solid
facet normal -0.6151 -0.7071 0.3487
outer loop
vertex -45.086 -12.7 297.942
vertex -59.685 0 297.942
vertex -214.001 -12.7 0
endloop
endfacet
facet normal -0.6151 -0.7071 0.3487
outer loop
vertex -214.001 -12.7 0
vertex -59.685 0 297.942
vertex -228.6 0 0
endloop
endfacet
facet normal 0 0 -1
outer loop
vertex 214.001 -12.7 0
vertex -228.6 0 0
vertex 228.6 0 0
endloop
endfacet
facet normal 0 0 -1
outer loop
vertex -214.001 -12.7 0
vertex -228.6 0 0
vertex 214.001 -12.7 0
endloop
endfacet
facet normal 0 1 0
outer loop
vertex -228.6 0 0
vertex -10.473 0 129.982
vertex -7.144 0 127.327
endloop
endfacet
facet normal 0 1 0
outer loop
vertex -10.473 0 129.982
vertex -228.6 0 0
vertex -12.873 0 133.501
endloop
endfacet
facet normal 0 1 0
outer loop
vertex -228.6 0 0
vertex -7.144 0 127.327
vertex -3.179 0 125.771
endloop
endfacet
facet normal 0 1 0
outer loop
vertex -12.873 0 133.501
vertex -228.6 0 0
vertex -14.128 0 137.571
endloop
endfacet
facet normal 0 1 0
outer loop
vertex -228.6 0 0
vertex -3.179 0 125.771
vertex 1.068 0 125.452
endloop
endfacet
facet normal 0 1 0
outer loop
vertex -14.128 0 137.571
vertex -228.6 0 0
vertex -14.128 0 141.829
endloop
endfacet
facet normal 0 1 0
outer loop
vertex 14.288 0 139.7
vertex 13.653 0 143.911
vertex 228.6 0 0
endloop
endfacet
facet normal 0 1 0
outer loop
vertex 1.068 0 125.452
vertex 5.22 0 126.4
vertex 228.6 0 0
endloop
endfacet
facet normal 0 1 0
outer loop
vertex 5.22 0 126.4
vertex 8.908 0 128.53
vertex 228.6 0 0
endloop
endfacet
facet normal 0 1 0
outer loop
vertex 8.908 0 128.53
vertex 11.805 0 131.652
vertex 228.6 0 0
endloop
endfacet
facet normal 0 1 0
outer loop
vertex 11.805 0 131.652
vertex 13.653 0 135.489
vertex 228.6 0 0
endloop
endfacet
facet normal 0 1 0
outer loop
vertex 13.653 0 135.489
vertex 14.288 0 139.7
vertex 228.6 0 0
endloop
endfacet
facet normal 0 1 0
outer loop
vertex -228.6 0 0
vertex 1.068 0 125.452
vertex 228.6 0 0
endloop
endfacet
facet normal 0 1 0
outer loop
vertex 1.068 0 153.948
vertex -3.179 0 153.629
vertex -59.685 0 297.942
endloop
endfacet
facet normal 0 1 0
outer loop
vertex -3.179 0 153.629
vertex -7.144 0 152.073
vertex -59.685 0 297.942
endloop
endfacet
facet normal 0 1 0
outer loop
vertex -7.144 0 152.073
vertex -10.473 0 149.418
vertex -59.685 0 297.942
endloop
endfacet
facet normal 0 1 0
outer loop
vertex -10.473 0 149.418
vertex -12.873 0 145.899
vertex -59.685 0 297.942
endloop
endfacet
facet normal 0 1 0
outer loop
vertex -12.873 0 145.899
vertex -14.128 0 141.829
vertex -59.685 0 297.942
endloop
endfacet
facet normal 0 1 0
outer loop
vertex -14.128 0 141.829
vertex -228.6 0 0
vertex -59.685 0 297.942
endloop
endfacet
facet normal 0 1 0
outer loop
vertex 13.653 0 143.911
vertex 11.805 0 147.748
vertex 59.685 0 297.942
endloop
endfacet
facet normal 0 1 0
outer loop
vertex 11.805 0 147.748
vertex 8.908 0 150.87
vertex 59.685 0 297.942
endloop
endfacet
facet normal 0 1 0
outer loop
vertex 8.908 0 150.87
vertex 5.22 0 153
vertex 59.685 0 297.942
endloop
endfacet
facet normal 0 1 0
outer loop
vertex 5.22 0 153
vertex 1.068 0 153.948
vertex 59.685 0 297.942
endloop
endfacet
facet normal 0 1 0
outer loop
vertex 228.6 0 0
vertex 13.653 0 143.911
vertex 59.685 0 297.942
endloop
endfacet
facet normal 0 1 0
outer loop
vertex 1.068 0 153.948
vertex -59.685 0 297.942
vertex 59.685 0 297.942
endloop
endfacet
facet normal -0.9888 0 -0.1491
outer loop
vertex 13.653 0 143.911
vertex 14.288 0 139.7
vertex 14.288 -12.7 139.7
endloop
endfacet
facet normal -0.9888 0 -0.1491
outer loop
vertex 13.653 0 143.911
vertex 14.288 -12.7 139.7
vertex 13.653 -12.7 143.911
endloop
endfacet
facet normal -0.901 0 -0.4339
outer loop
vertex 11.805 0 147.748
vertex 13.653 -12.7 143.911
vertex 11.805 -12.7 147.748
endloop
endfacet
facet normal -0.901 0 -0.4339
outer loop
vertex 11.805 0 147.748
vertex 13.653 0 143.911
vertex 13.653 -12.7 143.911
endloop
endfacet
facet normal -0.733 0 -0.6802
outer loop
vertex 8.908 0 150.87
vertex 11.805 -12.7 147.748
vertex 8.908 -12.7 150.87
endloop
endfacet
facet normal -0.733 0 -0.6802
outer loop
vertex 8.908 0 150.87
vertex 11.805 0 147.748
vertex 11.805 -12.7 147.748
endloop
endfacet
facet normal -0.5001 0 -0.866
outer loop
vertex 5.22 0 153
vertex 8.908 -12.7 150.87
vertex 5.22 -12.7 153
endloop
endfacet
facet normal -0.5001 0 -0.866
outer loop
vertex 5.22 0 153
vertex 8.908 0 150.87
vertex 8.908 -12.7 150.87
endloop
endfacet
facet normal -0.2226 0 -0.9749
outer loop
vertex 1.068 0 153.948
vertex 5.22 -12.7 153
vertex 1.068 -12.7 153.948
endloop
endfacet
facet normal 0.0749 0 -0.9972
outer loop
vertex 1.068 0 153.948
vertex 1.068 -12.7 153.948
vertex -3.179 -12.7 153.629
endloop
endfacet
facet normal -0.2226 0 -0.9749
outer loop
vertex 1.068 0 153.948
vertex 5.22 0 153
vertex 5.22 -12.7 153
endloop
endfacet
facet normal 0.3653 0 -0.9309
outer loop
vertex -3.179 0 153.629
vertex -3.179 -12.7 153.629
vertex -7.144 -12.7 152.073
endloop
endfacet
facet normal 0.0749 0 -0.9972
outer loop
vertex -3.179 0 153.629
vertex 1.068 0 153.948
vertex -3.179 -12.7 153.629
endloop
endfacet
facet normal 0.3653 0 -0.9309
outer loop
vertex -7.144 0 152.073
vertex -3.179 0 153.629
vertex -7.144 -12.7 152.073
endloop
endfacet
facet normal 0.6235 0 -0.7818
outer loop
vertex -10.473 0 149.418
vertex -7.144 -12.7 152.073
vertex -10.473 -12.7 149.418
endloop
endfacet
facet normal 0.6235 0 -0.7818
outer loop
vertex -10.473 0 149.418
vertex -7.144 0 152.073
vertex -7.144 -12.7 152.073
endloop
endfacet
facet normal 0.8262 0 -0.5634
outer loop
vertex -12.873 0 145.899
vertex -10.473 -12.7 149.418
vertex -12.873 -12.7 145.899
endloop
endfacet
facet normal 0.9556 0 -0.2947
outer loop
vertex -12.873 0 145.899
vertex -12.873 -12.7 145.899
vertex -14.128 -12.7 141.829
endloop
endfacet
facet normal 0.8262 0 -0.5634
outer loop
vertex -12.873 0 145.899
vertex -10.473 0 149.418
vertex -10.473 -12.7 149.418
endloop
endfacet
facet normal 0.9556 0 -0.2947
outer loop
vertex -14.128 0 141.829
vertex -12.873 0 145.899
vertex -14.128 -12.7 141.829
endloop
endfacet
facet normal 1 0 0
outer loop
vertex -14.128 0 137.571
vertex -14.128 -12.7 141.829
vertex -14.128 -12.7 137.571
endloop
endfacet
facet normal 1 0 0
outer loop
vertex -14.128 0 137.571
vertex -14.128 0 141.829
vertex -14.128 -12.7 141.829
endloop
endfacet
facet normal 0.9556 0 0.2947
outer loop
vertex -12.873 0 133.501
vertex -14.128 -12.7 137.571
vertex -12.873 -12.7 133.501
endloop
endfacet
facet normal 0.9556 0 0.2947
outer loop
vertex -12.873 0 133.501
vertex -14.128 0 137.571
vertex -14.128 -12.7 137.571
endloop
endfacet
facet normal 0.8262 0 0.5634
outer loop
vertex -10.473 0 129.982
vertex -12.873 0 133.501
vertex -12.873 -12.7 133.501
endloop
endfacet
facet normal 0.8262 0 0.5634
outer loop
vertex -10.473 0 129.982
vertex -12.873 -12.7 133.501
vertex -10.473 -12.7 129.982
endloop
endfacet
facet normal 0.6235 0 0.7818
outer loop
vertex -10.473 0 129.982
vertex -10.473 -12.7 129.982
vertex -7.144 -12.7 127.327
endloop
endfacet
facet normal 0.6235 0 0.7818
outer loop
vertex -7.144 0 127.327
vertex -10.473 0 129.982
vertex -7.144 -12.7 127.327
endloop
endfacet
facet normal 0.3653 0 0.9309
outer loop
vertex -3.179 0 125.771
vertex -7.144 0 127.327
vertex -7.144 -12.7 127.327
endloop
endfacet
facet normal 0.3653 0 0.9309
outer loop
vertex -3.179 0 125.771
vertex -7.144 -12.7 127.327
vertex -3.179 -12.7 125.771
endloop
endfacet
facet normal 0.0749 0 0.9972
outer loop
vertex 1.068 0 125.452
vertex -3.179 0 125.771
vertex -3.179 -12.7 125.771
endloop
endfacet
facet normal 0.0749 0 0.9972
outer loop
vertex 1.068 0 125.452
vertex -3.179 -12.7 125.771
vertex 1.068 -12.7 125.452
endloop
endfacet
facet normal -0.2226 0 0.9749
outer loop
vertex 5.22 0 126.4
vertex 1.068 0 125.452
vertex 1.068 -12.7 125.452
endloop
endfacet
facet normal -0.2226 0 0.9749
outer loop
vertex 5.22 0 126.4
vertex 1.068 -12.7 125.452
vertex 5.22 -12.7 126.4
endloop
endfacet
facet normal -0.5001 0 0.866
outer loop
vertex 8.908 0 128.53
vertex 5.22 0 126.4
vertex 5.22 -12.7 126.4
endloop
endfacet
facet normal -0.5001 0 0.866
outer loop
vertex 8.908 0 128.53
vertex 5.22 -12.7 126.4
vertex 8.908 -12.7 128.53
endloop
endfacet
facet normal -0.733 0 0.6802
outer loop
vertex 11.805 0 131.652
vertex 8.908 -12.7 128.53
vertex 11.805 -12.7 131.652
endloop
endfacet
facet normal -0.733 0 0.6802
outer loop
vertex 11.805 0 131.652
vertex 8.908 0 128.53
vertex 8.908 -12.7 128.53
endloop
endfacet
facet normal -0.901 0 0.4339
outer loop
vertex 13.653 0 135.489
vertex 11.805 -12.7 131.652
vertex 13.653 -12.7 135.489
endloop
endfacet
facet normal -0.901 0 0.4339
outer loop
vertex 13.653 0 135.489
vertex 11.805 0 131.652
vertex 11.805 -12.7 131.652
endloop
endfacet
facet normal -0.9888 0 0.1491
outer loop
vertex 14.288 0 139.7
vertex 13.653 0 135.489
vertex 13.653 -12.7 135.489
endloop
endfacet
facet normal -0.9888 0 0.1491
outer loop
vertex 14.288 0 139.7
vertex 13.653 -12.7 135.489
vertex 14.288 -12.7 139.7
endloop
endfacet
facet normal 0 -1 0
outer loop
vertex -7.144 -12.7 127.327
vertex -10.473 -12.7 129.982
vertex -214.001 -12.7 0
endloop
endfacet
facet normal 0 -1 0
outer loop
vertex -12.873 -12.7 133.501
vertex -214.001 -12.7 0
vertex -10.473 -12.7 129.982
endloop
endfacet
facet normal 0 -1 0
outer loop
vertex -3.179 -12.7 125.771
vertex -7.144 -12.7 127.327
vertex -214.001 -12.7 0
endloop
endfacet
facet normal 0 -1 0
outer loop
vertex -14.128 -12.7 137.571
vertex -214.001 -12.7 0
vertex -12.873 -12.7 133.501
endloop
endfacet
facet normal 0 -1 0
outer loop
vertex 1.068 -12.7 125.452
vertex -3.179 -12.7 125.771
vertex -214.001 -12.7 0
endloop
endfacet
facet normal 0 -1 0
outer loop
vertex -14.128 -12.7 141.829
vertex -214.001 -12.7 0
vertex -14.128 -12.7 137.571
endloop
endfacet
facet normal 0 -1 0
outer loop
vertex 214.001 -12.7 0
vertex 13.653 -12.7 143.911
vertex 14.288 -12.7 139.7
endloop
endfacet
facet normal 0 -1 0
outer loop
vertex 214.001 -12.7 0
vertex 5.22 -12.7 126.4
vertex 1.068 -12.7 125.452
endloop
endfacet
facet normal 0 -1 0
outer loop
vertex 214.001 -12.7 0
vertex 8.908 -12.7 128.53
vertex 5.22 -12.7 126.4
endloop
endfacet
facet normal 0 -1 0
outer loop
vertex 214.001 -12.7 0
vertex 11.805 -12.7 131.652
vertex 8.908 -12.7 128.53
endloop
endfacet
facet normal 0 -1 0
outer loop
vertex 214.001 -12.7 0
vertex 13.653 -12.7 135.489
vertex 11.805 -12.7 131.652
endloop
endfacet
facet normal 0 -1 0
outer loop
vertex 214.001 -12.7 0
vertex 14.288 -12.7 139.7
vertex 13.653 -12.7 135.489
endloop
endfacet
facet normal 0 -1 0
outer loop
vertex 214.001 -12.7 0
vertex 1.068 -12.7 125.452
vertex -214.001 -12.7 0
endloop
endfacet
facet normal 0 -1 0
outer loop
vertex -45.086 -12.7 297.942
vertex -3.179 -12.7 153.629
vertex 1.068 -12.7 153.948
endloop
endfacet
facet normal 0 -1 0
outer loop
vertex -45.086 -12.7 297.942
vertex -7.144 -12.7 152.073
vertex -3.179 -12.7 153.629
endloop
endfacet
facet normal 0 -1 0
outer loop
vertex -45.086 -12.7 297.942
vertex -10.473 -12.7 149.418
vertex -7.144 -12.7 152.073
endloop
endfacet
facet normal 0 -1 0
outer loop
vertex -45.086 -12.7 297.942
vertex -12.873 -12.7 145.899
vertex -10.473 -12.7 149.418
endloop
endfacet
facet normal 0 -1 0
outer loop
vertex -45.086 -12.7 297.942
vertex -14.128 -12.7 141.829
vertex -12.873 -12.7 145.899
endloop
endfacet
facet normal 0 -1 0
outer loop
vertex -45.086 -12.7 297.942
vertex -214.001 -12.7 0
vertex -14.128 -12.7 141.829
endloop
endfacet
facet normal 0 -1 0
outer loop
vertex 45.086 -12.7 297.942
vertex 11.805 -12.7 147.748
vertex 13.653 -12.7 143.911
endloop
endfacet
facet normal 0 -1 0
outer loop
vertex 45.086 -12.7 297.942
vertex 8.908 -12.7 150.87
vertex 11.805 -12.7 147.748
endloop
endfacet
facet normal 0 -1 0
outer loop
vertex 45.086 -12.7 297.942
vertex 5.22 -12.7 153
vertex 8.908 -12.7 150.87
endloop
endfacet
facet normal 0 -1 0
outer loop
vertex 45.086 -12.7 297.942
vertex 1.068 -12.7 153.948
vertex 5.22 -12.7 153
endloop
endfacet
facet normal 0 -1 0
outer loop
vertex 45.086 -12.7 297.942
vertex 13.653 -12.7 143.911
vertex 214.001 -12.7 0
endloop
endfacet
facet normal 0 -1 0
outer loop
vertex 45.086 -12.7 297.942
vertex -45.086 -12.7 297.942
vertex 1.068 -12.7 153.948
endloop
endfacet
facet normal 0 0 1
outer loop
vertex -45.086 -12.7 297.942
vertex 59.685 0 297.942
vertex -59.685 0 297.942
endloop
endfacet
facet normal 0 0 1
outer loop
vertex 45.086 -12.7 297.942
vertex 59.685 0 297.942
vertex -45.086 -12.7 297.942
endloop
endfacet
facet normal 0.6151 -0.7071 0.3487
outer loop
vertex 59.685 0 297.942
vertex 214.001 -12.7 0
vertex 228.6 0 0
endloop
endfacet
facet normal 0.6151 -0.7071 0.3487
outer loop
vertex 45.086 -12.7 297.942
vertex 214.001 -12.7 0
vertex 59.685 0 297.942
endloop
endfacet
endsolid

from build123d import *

# Parameters (mm, degrees)
F0_R     = 14.2875
F1_DEPTH = 12.7
F2_SIZE2 = 12.69999
F2_SIZE  = 12.69999
F3_SIZE2 = 12.69999
F3_SIZE  = 12.69999


# Not quite as in the source:
# - a fillet or chamfer is up to 0.001 mm smaller than in the source, because OpenCascade refuses the exact size


with BuildPart() as f1:
    # F0 (on Front) → F1 (new body)
    with BuildSketch(Plane.XZ):
        Polygon((-228.6, 0), (228.6, 0), (59.6845457723, 297.942), (-59.6845457723, 297.942), align=None)
        with Locations((0, 139.7)):
            Circle(F0_R, mode=Mode.SUBTRACT)
    extrude(amount=F1_DEPTH)

    # F2 (size 12.7 and 12.7 in the source; OpenCascade refuses exactly that, so slightly less here)
    f2_edges = [f1.edges().sort_by_distance(p)[0] for p in [
        (144.142273, -12.7, 148.971),
    ]]
    chamfer(f2_edges, length=F2_SIZE, length2=F2_SIZE2)

    # F3 (size 12.7 and 12.7 in the source; OpenCascade refuses exactly that, so slightly less here)
    f3_edges = [f1.edges().sort_by_distance(p)[0] for p in [
        (-144.142273, -12.7, 148.971),
    ]]
    chamfer(f3_edges, length=F3_SIZE, length2=F3_SIZE2)


solid = f1.part
